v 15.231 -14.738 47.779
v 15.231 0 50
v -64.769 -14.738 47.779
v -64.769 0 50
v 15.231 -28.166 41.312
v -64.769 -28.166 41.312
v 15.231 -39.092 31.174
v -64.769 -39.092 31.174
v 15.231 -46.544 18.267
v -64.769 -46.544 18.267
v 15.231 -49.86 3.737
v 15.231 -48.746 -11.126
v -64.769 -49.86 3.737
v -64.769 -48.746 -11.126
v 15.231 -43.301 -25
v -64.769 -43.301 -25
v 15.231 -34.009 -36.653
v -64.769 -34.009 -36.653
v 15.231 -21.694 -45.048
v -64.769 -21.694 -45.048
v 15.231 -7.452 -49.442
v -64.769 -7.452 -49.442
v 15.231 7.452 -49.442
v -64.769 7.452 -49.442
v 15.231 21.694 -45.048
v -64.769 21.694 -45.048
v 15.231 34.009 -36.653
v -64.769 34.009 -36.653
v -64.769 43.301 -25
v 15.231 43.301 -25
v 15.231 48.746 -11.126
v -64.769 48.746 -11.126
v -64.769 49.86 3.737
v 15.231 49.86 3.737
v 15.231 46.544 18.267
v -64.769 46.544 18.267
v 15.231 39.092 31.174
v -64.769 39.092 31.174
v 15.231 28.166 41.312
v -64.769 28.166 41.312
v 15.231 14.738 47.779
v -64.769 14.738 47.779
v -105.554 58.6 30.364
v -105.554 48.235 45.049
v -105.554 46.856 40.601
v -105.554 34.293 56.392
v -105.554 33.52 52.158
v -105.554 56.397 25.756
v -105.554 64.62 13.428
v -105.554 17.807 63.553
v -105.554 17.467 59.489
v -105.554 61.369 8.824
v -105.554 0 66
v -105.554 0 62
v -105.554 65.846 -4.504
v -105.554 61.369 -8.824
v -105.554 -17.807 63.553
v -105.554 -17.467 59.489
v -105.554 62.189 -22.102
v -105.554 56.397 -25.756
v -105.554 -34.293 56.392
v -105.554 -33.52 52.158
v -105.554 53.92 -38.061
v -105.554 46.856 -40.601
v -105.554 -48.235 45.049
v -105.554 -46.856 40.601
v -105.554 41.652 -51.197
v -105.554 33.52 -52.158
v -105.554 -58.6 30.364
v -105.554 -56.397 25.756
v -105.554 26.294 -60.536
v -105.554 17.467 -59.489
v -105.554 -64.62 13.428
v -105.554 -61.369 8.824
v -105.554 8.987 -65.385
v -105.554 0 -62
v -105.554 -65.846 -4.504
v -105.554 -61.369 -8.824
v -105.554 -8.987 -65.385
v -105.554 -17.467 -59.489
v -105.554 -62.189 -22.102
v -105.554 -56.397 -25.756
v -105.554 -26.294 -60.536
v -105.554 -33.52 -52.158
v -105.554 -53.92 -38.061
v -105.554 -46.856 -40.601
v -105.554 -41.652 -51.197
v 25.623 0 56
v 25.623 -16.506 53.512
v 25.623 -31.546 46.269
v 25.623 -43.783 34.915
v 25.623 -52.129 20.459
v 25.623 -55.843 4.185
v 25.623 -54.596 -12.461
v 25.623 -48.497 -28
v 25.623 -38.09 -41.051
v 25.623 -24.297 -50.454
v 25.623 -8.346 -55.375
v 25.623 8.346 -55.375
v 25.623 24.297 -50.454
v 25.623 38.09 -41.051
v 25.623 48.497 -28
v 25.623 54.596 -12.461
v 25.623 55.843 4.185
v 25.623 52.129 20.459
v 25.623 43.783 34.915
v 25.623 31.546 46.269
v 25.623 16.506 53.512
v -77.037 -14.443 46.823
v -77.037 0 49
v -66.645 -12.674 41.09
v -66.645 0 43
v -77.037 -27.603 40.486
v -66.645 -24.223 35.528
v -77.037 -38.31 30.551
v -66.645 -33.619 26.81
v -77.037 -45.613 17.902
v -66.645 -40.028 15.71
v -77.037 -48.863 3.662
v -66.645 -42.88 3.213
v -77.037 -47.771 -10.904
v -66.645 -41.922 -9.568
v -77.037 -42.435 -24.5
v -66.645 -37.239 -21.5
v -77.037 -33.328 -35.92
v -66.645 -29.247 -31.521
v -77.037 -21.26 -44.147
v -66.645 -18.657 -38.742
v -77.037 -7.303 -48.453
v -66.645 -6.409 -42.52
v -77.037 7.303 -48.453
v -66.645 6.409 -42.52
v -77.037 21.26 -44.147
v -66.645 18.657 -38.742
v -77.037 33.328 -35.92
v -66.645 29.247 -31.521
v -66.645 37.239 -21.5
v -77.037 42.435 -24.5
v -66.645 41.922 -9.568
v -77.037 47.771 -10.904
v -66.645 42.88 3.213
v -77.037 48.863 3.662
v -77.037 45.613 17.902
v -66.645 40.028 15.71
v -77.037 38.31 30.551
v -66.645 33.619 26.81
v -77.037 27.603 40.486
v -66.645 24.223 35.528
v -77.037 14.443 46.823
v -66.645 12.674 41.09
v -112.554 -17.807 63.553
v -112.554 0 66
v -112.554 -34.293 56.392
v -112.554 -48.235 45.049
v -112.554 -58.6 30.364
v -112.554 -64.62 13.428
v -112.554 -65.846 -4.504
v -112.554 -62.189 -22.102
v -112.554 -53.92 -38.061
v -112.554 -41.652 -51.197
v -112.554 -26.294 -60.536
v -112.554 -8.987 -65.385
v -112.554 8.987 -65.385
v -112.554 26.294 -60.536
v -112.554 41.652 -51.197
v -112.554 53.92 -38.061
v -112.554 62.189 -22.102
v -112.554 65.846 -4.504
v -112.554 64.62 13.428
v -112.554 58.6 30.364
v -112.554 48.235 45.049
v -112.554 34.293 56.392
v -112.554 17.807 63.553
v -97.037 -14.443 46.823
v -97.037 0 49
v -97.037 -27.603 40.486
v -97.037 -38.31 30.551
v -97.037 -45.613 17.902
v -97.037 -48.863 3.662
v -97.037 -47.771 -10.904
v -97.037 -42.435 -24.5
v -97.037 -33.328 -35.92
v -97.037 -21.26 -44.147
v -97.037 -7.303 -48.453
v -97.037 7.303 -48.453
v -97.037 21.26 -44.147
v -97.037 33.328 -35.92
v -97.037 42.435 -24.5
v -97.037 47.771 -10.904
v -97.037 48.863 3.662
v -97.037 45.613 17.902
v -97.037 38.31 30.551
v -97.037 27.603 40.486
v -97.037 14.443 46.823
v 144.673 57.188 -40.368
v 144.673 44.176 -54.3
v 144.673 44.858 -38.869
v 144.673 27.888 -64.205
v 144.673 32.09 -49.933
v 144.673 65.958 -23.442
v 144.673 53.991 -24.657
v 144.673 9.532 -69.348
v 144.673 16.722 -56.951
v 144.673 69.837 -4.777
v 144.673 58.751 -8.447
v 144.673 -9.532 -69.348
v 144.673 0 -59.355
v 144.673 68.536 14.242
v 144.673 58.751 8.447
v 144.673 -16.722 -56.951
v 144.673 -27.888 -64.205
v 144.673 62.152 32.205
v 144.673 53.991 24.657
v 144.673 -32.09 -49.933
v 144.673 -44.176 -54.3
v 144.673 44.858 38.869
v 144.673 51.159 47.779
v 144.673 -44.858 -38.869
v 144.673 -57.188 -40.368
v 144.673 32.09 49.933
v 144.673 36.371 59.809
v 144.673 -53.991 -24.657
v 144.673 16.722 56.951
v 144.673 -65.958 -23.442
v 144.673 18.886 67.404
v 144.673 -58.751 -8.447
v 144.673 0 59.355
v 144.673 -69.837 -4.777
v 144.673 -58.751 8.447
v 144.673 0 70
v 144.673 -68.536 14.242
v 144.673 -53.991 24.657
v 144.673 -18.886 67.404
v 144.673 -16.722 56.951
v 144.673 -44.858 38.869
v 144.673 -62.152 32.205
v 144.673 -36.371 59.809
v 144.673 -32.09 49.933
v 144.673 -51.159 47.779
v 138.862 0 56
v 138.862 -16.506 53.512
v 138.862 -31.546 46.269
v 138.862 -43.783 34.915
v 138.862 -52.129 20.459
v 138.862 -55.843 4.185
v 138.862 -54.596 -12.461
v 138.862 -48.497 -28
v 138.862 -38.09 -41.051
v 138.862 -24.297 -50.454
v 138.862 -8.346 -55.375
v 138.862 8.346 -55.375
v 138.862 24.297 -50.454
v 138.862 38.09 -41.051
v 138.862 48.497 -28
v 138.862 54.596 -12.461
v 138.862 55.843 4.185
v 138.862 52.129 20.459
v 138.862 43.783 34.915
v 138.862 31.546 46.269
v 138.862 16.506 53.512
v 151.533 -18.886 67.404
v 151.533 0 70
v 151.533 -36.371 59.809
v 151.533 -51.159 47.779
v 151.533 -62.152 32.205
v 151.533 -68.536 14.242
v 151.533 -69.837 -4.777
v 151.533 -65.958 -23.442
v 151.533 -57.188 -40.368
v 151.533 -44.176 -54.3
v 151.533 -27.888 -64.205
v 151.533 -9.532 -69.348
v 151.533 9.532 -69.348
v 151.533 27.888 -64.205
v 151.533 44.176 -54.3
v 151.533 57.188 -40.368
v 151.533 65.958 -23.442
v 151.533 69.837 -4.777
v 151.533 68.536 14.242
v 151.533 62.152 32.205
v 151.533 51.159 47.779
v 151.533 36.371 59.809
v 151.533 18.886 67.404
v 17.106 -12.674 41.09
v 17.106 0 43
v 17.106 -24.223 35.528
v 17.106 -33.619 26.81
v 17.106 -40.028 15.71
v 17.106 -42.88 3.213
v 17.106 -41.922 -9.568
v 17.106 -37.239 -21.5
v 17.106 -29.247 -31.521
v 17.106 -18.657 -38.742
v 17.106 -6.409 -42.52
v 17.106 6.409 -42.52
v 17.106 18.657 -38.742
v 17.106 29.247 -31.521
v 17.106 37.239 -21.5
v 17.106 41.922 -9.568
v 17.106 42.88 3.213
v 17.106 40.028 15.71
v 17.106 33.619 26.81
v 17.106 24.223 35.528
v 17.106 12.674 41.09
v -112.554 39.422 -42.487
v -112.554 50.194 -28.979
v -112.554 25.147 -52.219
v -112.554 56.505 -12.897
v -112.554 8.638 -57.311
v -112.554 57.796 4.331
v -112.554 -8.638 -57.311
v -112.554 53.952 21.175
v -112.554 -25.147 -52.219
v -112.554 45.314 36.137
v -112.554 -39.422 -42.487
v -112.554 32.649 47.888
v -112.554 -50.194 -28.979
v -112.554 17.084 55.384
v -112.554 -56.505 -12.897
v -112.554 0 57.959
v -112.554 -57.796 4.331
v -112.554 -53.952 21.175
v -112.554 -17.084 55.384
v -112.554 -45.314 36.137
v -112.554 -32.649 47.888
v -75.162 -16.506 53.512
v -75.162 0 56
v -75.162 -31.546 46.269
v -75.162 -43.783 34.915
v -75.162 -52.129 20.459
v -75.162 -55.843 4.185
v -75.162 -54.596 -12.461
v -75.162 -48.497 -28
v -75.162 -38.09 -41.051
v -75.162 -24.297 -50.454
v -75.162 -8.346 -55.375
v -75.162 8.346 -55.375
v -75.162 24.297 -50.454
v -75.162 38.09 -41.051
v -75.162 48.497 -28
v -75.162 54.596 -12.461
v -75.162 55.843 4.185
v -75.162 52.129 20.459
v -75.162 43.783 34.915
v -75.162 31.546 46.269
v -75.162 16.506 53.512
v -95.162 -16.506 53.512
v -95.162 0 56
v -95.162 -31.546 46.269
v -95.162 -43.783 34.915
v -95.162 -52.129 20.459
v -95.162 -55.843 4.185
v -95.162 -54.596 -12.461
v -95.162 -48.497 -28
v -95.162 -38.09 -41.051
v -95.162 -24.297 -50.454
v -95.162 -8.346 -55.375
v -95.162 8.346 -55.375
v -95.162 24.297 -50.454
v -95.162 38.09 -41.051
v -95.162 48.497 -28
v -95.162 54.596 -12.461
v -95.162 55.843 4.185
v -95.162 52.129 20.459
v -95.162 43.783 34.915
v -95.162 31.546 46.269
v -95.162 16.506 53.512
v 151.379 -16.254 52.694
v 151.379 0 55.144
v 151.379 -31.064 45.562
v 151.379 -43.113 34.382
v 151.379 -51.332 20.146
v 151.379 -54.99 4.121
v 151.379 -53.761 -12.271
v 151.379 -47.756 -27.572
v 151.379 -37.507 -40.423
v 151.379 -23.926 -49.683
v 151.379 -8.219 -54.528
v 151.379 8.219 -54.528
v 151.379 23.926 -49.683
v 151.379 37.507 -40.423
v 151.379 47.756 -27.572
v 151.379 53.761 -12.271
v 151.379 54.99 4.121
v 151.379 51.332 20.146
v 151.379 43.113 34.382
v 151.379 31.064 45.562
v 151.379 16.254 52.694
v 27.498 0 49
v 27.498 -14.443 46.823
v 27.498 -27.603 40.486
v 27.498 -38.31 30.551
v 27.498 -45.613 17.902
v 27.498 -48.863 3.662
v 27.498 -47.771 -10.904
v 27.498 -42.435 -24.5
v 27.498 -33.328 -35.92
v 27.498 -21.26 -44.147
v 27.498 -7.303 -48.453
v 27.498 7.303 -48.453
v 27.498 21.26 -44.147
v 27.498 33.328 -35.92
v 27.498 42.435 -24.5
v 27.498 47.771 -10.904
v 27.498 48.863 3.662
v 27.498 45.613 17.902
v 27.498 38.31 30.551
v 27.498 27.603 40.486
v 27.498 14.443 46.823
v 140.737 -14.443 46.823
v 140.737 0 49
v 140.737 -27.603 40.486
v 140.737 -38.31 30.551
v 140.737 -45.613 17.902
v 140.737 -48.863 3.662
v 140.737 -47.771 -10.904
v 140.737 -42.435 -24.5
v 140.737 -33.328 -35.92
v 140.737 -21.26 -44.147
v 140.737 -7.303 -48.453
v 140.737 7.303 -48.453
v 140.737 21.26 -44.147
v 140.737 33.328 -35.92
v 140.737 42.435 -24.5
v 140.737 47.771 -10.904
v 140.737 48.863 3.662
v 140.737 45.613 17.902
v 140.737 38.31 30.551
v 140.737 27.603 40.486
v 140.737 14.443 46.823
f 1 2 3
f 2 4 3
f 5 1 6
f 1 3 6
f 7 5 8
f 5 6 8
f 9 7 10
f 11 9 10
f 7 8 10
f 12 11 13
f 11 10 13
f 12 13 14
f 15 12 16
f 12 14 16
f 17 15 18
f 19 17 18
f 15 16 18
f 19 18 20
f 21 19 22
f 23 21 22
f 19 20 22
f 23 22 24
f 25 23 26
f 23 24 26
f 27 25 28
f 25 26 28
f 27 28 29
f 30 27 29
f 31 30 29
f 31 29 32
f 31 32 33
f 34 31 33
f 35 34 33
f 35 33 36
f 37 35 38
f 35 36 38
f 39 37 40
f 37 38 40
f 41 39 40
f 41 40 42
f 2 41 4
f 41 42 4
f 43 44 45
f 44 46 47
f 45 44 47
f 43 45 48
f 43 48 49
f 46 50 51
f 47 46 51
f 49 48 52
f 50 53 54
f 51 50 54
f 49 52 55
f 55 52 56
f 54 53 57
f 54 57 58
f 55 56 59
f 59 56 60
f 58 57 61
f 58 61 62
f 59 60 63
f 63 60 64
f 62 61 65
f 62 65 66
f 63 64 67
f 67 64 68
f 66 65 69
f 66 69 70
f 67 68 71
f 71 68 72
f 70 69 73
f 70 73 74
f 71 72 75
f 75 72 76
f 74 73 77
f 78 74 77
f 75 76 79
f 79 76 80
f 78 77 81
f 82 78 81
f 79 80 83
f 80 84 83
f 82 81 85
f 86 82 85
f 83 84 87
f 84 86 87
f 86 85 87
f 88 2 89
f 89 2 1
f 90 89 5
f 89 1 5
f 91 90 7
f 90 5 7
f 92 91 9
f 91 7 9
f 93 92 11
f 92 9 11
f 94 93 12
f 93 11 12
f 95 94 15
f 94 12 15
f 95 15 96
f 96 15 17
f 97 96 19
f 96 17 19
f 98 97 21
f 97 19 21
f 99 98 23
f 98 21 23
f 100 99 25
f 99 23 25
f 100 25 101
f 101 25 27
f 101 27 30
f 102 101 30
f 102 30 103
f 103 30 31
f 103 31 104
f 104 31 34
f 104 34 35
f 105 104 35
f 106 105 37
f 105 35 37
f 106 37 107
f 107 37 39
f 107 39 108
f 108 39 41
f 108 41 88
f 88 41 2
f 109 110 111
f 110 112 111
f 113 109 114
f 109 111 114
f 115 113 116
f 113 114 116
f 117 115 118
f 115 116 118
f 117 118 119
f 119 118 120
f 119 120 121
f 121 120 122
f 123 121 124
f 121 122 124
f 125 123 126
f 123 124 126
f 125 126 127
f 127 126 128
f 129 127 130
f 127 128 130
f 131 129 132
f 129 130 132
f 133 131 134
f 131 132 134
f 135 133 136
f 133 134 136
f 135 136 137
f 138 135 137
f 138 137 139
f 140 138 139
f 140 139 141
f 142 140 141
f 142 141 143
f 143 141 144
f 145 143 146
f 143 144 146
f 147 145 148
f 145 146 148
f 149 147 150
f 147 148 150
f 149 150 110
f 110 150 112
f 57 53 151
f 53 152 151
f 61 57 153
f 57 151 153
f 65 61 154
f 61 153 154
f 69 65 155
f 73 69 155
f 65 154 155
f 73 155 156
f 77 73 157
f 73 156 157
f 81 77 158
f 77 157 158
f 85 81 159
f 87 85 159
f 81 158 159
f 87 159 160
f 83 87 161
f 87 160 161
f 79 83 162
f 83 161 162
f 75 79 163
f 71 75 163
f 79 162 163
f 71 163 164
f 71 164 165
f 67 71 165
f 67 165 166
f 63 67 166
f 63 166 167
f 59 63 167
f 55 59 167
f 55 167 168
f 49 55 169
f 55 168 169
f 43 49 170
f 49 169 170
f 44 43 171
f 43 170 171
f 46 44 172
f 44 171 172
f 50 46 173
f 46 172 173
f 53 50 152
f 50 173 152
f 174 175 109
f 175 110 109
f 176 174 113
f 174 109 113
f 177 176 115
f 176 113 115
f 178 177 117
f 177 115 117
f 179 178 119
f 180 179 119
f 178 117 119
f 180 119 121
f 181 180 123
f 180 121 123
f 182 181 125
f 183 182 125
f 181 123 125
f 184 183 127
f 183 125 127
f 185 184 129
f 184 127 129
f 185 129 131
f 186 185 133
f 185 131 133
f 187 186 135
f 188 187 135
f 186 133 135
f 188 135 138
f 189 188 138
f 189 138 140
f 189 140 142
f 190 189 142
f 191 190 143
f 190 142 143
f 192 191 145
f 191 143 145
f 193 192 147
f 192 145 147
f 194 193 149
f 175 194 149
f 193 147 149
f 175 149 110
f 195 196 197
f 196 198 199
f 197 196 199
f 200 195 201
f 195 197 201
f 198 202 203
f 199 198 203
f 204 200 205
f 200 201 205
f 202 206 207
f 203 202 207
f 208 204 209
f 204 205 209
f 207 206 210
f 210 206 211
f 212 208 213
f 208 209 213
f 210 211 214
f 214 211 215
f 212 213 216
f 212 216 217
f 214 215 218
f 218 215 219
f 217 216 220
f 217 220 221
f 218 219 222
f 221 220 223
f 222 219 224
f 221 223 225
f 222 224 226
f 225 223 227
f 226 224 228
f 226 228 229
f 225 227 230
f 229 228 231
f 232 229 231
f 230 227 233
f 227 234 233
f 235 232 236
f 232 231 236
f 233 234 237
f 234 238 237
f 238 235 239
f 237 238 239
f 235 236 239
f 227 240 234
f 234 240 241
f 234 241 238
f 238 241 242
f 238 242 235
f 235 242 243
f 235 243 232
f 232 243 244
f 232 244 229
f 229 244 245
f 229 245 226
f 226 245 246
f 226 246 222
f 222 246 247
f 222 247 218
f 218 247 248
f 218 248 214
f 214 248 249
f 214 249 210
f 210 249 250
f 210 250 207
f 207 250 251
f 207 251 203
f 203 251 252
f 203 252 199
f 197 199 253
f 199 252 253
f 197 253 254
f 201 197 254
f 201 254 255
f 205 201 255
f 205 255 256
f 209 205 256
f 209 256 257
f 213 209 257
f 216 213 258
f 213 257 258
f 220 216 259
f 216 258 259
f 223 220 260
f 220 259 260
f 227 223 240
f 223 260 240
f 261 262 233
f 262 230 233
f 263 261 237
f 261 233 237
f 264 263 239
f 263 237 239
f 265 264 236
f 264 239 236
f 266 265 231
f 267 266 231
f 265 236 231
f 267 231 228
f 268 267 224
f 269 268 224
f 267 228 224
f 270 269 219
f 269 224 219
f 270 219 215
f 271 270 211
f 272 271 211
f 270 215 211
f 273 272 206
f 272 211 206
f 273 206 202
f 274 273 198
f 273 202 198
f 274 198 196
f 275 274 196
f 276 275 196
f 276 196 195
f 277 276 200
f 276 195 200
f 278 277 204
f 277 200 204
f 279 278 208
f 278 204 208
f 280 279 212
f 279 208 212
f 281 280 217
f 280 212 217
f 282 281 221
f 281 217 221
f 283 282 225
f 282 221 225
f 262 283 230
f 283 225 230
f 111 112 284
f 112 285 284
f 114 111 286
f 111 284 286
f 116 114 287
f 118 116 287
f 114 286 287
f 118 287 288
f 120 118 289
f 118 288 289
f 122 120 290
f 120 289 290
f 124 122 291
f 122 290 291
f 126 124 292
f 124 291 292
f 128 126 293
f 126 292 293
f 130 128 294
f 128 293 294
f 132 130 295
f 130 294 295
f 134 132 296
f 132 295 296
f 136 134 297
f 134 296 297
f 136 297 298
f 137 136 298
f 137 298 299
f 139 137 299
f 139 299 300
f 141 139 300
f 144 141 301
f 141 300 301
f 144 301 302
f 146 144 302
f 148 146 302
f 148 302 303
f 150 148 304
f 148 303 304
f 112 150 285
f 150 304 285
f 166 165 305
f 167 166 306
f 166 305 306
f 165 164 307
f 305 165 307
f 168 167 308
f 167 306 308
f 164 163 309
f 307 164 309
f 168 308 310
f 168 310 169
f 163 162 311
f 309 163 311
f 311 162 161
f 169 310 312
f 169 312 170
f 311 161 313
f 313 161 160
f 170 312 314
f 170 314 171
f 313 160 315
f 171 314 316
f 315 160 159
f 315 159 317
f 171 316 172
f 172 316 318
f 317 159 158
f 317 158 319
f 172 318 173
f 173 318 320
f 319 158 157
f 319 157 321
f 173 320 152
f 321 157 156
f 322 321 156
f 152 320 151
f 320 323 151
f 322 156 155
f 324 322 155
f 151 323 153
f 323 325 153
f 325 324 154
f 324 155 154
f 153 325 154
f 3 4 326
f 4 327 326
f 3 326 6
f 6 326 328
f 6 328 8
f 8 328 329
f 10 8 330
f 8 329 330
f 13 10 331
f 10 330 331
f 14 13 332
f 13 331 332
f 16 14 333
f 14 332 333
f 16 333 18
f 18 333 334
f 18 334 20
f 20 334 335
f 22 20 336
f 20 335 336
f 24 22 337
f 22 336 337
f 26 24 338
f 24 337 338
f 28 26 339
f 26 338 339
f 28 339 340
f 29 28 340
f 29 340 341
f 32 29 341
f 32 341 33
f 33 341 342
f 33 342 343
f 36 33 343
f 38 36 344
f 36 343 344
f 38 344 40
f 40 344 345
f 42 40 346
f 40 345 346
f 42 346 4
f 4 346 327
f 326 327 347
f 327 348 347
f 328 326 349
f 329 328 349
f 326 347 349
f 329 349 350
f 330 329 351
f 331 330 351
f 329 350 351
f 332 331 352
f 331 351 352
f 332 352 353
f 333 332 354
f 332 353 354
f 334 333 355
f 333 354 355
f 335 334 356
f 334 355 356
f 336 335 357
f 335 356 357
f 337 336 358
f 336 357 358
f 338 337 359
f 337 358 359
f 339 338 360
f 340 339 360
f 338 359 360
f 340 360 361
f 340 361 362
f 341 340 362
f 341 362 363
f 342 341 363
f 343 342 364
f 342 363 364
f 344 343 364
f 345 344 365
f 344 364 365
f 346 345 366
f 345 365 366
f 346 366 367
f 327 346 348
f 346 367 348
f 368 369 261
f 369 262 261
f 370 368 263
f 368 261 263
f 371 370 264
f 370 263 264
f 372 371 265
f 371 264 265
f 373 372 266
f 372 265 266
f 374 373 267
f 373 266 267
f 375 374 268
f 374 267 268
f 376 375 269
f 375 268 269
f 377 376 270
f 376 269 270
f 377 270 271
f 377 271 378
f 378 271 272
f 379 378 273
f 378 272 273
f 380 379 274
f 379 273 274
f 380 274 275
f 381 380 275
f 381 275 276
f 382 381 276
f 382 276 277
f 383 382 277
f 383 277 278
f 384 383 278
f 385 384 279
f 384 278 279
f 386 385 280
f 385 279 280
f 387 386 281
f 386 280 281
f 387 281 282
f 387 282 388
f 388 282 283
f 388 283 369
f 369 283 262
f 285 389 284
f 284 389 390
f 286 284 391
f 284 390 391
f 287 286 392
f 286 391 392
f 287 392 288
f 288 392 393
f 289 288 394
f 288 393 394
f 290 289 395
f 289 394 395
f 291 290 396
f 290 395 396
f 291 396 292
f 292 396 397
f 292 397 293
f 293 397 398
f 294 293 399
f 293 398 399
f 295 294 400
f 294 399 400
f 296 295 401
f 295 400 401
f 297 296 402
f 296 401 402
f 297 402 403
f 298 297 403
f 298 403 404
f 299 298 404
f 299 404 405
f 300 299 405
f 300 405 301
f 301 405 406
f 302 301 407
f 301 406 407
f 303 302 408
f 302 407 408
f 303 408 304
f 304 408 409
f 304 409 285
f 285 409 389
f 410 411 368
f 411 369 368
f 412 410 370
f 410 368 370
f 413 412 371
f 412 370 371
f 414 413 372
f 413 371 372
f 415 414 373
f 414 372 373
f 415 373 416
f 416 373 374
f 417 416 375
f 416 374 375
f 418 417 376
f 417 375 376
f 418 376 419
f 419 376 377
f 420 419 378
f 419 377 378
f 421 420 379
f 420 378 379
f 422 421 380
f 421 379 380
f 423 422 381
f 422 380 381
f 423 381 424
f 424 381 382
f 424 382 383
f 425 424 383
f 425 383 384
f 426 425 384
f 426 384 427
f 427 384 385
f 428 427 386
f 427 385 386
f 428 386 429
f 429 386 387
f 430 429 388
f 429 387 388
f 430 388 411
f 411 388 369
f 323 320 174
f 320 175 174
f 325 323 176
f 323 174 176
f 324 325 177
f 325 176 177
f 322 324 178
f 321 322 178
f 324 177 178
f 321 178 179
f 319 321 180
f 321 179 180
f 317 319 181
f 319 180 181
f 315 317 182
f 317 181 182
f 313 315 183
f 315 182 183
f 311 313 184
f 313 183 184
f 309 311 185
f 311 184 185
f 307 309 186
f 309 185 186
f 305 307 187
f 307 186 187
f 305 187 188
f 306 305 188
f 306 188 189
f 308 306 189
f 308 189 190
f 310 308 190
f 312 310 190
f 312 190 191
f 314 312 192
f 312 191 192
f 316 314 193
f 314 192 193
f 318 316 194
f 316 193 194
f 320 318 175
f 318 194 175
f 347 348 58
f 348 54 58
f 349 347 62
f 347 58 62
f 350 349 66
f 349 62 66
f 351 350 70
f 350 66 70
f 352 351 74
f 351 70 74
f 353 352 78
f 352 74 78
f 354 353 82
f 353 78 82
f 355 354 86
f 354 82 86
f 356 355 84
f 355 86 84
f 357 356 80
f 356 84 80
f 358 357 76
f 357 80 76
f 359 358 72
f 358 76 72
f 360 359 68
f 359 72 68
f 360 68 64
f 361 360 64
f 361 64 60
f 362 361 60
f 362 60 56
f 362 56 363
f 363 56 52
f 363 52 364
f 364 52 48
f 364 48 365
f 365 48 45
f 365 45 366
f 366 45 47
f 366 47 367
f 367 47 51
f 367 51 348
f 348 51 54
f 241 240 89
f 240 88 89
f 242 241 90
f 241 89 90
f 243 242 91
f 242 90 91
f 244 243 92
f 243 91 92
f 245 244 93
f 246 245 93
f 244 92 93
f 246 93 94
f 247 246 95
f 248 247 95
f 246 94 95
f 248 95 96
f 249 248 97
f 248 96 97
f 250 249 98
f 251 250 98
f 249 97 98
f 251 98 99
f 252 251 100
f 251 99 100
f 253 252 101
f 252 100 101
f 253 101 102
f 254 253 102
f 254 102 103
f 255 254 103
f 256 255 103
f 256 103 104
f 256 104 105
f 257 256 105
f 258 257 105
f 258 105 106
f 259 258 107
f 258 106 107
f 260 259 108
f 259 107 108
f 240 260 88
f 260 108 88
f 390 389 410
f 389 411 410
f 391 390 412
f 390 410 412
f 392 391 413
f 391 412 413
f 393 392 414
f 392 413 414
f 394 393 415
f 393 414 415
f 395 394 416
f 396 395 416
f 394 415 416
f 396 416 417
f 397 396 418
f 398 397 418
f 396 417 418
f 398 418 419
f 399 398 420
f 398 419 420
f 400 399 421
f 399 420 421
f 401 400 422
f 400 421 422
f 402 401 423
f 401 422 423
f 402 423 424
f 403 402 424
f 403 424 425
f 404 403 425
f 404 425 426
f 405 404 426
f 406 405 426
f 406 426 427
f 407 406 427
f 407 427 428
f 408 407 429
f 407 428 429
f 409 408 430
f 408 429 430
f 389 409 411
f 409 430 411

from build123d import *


with BuildPart() as f1:
    # F0 (on Front) → F1 (revolve)
    with BuildSketch(Plane.XZ):
        Polygon((-105.55408, 62), (-105.55408, 66), (-112.55408, 66), (-112.55408, 57.958548), (-97.03742, 49), (-77.03742, 49), (-66.645115, 43), (17.106174, 43), (27.498479, 49), (140.737355, 49), (151.378544, 55.143693), (151.532518, 70), (144.673228, 70), (144.673228, 66), (144.673228, 59.355281), (138.86171, 56), (25.622834, 56), (15.23053, 50), (-64.76947, 50), (-75.161775, 56), (-95.161775, 56), align=None)
    revolve(axis=Axis((50.378699, 0, 0), (1, 0, 0)))


solid = f1.part
